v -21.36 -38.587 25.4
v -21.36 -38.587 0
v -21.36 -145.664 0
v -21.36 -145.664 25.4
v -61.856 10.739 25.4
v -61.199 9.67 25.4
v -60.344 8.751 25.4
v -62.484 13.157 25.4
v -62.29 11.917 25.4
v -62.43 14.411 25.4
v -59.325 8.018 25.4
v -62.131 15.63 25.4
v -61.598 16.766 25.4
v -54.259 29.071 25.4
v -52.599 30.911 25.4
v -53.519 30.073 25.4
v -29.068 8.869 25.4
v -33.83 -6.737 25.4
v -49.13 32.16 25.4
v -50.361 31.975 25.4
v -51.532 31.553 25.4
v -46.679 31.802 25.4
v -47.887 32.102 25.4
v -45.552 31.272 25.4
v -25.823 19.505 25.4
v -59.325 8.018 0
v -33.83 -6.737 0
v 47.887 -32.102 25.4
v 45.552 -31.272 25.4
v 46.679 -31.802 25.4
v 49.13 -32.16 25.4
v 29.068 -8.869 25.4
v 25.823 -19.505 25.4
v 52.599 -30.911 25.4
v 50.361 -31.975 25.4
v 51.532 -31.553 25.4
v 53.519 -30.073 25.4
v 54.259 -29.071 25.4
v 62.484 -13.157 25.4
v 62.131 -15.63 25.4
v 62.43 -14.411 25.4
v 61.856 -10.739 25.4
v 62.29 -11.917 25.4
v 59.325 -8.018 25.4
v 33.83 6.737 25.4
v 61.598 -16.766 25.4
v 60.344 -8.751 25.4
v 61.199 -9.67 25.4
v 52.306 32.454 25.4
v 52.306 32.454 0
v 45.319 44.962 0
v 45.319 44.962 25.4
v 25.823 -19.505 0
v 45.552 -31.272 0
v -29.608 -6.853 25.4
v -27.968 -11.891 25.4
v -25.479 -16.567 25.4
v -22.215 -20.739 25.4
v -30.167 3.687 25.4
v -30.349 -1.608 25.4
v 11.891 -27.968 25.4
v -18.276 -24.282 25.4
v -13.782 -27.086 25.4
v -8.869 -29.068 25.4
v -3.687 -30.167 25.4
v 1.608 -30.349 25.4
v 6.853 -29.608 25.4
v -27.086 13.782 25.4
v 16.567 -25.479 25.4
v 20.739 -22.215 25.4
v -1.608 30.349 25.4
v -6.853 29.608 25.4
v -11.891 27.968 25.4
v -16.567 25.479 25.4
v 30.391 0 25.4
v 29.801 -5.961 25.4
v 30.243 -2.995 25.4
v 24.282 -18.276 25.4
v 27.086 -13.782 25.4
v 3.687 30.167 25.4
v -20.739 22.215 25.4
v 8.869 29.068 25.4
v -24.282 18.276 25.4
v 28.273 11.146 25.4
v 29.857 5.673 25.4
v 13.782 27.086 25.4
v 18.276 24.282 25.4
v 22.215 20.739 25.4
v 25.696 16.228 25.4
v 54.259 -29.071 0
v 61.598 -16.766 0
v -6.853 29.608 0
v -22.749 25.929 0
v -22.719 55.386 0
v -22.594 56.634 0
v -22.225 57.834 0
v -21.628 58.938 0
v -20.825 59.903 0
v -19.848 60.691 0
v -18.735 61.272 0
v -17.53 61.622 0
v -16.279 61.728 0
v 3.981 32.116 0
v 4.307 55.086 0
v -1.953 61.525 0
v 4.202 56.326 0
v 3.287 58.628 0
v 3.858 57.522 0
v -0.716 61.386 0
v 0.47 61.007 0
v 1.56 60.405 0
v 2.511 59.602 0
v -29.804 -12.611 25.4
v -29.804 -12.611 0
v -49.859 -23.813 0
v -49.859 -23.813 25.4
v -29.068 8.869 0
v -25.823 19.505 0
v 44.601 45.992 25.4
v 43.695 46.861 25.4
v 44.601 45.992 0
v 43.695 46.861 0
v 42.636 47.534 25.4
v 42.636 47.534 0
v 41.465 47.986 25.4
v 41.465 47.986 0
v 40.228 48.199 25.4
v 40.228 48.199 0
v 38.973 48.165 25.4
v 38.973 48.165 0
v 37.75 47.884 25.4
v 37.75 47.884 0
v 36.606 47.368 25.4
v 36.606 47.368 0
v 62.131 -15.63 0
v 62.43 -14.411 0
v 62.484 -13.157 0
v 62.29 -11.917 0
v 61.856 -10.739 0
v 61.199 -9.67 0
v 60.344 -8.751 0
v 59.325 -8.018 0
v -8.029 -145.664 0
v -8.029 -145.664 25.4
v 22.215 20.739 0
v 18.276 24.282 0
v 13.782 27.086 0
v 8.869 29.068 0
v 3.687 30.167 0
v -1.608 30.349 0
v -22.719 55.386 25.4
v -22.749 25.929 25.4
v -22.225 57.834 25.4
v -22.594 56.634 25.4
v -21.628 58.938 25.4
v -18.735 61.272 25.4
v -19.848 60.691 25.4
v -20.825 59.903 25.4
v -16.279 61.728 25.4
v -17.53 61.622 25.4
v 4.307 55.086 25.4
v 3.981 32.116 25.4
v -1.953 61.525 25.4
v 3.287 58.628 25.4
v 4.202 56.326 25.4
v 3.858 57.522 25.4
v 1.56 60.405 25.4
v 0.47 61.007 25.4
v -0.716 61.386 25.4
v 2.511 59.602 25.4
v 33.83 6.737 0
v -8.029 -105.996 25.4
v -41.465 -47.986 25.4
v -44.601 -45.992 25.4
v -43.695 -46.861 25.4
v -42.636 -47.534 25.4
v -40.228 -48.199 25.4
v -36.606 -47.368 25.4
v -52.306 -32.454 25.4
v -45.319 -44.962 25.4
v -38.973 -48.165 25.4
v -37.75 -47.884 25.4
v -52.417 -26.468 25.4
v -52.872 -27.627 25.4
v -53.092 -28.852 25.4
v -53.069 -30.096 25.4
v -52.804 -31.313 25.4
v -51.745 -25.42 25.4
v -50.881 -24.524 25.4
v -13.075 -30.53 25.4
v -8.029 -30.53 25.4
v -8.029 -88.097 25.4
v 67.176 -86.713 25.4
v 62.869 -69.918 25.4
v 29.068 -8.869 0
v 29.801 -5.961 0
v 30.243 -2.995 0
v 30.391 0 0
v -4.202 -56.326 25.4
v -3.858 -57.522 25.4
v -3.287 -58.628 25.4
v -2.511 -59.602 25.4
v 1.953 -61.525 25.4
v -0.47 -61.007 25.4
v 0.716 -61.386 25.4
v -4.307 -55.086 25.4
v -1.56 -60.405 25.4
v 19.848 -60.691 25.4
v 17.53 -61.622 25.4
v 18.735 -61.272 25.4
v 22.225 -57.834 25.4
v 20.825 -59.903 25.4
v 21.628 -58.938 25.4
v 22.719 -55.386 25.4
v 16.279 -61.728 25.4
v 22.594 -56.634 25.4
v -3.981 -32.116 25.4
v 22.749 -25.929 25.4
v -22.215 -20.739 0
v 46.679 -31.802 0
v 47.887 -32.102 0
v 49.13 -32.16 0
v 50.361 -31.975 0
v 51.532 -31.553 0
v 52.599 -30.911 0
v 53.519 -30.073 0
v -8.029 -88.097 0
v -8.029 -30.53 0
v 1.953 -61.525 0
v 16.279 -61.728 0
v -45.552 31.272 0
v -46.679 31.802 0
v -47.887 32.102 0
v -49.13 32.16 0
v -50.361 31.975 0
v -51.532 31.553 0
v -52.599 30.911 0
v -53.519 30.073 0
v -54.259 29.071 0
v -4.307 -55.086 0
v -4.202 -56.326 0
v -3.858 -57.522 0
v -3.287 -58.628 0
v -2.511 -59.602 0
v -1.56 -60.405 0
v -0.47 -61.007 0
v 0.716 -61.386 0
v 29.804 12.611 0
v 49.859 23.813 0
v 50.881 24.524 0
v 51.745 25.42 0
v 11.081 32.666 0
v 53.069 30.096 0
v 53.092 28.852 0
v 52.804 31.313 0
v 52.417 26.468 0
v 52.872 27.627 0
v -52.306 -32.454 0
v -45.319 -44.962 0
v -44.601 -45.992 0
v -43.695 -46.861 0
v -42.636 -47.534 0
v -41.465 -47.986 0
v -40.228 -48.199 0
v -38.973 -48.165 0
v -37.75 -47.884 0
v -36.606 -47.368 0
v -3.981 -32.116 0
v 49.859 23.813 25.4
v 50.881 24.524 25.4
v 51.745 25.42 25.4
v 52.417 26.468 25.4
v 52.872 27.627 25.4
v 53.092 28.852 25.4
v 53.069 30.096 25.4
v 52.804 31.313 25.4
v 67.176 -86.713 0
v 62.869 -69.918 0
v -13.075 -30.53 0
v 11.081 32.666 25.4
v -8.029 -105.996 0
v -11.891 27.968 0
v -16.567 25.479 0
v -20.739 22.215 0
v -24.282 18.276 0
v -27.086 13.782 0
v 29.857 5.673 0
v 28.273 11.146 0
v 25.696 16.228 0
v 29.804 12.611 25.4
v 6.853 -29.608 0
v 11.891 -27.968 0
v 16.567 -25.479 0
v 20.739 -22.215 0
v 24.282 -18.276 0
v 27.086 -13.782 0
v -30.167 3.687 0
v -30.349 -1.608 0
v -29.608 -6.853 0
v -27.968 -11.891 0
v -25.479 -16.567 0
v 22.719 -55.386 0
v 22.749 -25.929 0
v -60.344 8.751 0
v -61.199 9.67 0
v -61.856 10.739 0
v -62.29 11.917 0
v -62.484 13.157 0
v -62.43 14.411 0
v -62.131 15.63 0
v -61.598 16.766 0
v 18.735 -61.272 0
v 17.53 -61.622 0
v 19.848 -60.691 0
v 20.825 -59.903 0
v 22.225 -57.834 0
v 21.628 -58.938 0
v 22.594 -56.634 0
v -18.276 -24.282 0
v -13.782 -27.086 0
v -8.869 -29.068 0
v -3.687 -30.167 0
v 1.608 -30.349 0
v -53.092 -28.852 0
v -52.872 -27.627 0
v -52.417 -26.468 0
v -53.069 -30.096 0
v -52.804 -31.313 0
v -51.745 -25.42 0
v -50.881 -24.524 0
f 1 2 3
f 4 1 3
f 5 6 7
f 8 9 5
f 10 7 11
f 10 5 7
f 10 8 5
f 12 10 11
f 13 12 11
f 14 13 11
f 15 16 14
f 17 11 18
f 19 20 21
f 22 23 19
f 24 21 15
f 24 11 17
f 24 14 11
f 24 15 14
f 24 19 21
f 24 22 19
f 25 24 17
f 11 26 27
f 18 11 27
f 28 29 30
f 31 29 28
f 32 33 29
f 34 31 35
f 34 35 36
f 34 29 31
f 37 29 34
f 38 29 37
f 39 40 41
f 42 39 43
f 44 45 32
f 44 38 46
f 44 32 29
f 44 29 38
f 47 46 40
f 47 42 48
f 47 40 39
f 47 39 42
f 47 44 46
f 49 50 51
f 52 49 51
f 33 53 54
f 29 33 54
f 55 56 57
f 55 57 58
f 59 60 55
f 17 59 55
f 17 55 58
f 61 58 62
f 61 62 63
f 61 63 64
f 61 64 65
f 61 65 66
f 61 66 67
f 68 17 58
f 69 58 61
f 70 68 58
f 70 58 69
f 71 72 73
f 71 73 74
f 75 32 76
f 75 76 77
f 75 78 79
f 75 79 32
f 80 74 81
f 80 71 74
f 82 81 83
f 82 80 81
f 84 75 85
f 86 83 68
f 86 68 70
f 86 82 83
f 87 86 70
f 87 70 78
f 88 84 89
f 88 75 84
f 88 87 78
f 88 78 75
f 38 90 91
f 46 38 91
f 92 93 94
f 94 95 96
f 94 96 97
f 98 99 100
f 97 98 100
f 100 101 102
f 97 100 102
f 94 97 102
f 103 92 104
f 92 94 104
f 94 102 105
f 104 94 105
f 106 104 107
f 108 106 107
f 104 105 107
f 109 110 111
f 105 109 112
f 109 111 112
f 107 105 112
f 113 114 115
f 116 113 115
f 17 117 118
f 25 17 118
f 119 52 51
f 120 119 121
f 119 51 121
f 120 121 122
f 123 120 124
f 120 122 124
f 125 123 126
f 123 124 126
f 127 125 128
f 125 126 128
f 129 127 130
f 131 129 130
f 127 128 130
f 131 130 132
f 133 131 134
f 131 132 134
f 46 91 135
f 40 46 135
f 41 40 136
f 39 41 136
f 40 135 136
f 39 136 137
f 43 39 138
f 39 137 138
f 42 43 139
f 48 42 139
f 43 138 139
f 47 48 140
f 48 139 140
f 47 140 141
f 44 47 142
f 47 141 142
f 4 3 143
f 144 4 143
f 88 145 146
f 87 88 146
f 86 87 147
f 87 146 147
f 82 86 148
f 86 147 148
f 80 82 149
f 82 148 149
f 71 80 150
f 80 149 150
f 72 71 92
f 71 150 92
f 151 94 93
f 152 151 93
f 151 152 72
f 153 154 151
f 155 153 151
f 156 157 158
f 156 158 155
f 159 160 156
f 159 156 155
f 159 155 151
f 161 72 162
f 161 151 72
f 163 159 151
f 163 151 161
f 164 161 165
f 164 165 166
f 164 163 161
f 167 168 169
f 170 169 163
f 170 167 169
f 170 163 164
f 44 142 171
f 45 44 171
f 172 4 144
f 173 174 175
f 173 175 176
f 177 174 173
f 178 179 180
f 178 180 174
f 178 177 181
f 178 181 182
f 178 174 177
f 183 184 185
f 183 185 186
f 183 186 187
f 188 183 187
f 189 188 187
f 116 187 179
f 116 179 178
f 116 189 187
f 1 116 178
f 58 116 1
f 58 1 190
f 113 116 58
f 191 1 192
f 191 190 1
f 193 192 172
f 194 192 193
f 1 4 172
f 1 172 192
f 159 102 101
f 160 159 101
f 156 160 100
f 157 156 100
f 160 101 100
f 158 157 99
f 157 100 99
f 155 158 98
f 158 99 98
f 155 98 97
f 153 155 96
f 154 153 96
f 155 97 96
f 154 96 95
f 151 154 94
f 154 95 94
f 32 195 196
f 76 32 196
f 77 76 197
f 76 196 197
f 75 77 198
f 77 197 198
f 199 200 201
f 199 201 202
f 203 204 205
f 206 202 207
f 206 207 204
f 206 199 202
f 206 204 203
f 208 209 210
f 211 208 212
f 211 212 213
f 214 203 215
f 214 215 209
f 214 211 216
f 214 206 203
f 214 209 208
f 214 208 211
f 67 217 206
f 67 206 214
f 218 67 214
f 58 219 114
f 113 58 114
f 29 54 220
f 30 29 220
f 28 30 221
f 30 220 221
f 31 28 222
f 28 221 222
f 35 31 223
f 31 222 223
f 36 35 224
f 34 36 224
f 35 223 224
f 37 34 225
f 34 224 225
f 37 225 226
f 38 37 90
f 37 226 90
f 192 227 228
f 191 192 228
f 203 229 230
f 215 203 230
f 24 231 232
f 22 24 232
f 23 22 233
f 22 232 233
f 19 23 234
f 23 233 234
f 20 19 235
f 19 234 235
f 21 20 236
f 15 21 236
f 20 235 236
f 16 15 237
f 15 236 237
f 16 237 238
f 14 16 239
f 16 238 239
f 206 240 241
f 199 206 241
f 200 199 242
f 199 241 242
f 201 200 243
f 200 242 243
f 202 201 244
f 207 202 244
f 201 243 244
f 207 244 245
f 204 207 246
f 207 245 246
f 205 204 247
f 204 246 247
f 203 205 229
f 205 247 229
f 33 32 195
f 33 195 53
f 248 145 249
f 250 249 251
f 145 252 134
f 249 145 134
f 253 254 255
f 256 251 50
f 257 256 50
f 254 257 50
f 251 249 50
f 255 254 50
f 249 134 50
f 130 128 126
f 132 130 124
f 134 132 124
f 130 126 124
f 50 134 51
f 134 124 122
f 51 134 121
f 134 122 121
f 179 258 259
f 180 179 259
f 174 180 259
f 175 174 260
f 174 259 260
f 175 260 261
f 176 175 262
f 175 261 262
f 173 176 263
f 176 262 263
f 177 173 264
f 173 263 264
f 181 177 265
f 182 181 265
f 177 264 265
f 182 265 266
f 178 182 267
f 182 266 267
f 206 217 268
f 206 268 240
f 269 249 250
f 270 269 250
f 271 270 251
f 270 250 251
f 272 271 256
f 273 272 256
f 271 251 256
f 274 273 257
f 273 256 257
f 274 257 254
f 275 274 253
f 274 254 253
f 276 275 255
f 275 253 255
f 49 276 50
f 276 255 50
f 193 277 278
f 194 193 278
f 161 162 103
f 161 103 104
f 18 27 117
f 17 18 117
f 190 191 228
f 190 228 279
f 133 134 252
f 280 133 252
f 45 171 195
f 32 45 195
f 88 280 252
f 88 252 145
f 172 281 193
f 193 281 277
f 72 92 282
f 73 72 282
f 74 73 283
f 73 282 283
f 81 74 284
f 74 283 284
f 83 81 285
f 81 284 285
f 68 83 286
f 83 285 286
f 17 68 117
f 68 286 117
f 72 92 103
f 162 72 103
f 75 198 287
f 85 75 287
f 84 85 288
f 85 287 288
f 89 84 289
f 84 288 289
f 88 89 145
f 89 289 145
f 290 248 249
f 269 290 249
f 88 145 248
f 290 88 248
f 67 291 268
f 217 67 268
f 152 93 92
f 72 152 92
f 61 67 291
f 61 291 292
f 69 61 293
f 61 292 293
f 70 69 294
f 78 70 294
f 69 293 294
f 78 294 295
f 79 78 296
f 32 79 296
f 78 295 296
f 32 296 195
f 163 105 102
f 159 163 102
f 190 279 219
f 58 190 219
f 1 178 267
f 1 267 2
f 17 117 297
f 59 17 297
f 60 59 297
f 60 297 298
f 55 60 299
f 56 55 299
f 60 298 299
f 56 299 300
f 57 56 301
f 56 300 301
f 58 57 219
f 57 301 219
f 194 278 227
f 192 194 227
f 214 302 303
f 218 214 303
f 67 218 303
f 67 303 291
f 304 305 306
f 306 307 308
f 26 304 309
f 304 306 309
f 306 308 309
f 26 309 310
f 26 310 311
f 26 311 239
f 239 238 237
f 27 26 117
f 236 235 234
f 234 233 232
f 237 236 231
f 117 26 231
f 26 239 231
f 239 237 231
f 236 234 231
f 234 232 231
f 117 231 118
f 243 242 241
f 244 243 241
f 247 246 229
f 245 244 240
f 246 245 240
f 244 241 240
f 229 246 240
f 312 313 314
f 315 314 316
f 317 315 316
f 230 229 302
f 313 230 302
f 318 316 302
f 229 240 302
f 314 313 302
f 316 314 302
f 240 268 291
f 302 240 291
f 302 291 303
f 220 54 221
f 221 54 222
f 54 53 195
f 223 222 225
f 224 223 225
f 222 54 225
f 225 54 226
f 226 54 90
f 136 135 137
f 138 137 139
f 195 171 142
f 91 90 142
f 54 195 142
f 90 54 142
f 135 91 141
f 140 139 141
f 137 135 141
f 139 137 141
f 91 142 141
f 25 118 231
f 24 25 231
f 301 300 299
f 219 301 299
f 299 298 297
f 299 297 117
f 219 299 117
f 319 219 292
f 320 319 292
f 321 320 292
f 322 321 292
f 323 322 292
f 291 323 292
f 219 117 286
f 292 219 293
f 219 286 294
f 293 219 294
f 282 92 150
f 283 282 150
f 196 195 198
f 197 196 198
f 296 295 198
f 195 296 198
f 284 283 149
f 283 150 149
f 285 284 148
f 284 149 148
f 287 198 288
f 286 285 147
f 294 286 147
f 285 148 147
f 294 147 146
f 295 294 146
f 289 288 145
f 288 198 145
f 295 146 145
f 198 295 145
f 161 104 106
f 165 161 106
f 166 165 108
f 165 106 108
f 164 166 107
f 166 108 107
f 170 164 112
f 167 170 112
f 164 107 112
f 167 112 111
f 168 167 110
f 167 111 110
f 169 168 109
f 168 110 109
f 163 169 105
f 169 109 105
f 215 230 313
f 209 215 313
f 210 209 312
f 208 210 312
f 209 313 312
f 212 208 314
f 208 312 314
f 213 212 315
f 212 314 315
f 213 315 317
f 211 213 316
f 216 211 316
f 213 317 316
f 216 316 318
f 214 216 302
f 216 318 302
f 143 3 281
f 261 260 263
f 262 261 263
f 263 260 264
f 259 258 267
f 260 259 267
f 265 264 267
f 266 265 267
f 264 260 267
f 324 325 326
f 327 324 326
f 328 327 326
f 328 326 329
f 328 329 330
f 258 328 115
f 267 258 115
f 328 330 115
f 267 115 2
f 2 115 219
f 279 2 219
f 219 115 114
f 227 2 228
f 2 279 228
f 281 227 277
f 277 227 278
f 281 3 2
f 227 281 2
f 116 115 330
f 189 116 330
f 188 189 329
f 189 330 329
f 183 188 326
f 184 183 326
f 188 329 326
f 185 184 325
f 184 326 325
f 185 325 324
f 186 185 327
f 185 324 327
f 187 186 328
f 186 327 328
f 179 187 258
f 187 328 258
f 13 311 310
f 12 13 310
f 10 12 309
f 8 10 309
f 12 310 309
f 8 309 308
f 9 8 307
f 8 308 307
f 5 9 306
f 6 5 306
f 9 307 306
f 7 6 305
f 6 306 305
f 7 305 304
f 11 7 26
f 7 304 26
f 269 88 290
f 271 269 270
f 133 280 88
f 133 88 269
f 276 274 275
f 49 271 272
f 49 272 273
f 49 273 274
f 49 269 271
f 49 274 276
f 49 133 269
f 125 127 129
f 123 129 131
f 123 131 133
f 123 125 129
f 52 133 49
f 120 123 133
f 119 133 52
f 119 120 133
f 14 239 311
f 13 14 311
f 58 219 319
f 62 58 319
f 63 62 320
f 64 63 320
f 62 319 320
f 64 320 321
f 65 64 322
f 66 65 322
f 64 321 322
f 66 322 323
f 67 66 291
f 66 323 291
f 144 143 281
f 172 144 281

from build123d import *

# Parameters (mm, degrees)
F1_DEPTH = 25.4
F3_DEPTH = 25.4


with BuildPart() as f1:
    # F0 (on Top) → F1 (new body)
    with BuildSketch(Plane.XY):
        with BuildLine():
            ThreePointArc((29.068178, -8.869105), (30.058563, -4.483614), (30.391117, 0))
            ThreePointArc((30.391117, 0), (28.273286, 11.146358), (22.214959, 20.739228))
            ThreePointArc((22.214959, 20.739228), (8.869104, 29.068178), (-6.85322, 29.608333))
            ThreePointArc((-6.85322, 29.608333), (-20.739228, 22.214959), (-29.068178, 8.869104))
            ThreePointArc((-29.068178, 8.869104), (-29.608333, -6.853219), (-22.214959, -20.739228))
            ThreePointArc((-22.214959, -20.739228), (-8.869105, -29.068178), (6.853219, -29.608333))
            ThreePointArc((6.853219, -29.608333), (20.739228, -22.214959), (29.068178, -8.869105))
        make_face()
        with BuildLine():
            Line((-22.749285, 25.928989), (-6.85322, 29.608333))
            Line((-6.85322, 29.608333), (3.980636, 32.115964))
            Line((3.980636, 32.115964), (4.306597, 55.085623))
            ThreePointArc((4.306597, 55.085623), (2.510625, 59.60169), (-1.95266, 61.525087))
            Line((-1.95266, 61.525087), (-16.278931, 61.72839))
            ThreePointArc((-16.278931, 61.72839), (-20.824869, 59.903191), (-22.719031, 55.385552))
            Line((-22.719031, 55.385552), (-22.749285, 25.928989))
        make_face()
        with BuildLine():
            Line((11.080521, 32.665953), (22.214959, 20.739228))
            Line((22.214959, 20.739228), (29.803559, 12.61065))
            Line((29.803559, 12.61065), (49.858847, 23.813189))
            ThreePointArc((49.858847, 23.813189), (52.87189, 27.62658), (52.305958, 32.453597))
            Line((52.305958, 32.453597), (45.318889, 44.962163))
            ThreePointArc((45.318889, 44.962163), (41.46525, 47.986461), (36.605779, 47.368034))
            Line((36.605779, 47.368034), (11.080521, 32.665953))
        make_face()
        with BuildLine():
            Line((33.829806, 6.736964), (29.068178, -8.869105))
            Line((29.068178, -8.869105), (25.822923, -19.505314))
            Line((25.822923, -19.505314), (45.55225, -31.272434))
            ThreePointArc((45.55225, -31.272434), (50.361265, -31.97511), (54.258618, -29.07149))
            Line((54.258618, -29.07149), (61.59782, -16.766228))
            ThreePointArc((61.59782, -16.766228), (62.29012, -11.91673), (59.32481, -8.017518))
            Line((59.32481, -8.017518), (33.829806, 6.736964))
        make_face()
        with BuildLine():
            Line((22.749285, -25.928989), (6.853219, -29.608333))
            Line((6.853219, -29.608333), (-3.980636, -32.115964))
            Line((-3.980636, -32.115964), (-4.306597, -55.085623))
            ThreePointArc((-4.306597, -55.085623), (-2.510625, -59.60169), (1.95266, -61.525087))
            Line((1.95266, -61.525087), (16.278931, -61.72839))
            ThreePointArc((16.278931, -61.72839), (20.824869, -59.903191), (22.719031, -55.385552))
            Line((22.719031, -55.385552), (22.749285, -25.928989))
        make_face()
        with BuildLine():
            Line((-11.080521, -32.665953), (-22.214959, -20.739228))
            Line((-22.214959, -20.739228), (-29.803559, -12.61065))
            Line((-29.803559, -12.61065), (-49.858847, -23.813189))
            ThreePointArc((-49.858847, -23.813189), (-52.87189, -27.62658), (-52.305958, -32.453597))
            Line((-52.305958, -32.453597), (-45.318889, -44.962163))
            ThreePointArc((-45.318889, -44.962163), (-41.46525, -47.986461), (-36.605779, -47.368034))
            Line((-36.605779, -47.368034), (-11.080521, -32.665953))
        make_face()
        with BuildLine():
            Line((-33.829806, -6.736964), (-29.068178, 8.869104))
            Line((-29.068178, 8.869104), (-25.822923, 19.505314))
            Line((-25.822923, 19.505314), (-45.55225, 31.272434))
            ThreePointArc((-45.55225, 31.272434), (-50.361265, 31.97511), (-54.258618, 29.07149))
            Line((-54.258618, 29.07149), (-61.59782, 16.766228))
            ThreePointArc((-61.59782, 16.766228), (-62.29012, 11.91673), (-59.32481, 8.017518))
            Line((-59.32481, 8.017518), (-33.829806, -6.736964))
        make_face()
    extrude(amount=F1_DEPTH)

    # F2 (on Top) → F3 (join)
    with BuildSketch(Plane.XY):
        Polygon((-8.02908, -88.096764), (-8.02908, -30.529775), (-21.360386, -30.529775), (-21.360386, -145.663753), (-8.02908, -145.663753), (-8.02908, -105.996133), align=None)
        Polygon((62.869214, -69.917716), (-8.02908, -88.096764), (-8.02908, -105.996133), (67.175662, -86.712868), align=None)
    extrude(amount=F3_DEPTH)


solid = f1.part
